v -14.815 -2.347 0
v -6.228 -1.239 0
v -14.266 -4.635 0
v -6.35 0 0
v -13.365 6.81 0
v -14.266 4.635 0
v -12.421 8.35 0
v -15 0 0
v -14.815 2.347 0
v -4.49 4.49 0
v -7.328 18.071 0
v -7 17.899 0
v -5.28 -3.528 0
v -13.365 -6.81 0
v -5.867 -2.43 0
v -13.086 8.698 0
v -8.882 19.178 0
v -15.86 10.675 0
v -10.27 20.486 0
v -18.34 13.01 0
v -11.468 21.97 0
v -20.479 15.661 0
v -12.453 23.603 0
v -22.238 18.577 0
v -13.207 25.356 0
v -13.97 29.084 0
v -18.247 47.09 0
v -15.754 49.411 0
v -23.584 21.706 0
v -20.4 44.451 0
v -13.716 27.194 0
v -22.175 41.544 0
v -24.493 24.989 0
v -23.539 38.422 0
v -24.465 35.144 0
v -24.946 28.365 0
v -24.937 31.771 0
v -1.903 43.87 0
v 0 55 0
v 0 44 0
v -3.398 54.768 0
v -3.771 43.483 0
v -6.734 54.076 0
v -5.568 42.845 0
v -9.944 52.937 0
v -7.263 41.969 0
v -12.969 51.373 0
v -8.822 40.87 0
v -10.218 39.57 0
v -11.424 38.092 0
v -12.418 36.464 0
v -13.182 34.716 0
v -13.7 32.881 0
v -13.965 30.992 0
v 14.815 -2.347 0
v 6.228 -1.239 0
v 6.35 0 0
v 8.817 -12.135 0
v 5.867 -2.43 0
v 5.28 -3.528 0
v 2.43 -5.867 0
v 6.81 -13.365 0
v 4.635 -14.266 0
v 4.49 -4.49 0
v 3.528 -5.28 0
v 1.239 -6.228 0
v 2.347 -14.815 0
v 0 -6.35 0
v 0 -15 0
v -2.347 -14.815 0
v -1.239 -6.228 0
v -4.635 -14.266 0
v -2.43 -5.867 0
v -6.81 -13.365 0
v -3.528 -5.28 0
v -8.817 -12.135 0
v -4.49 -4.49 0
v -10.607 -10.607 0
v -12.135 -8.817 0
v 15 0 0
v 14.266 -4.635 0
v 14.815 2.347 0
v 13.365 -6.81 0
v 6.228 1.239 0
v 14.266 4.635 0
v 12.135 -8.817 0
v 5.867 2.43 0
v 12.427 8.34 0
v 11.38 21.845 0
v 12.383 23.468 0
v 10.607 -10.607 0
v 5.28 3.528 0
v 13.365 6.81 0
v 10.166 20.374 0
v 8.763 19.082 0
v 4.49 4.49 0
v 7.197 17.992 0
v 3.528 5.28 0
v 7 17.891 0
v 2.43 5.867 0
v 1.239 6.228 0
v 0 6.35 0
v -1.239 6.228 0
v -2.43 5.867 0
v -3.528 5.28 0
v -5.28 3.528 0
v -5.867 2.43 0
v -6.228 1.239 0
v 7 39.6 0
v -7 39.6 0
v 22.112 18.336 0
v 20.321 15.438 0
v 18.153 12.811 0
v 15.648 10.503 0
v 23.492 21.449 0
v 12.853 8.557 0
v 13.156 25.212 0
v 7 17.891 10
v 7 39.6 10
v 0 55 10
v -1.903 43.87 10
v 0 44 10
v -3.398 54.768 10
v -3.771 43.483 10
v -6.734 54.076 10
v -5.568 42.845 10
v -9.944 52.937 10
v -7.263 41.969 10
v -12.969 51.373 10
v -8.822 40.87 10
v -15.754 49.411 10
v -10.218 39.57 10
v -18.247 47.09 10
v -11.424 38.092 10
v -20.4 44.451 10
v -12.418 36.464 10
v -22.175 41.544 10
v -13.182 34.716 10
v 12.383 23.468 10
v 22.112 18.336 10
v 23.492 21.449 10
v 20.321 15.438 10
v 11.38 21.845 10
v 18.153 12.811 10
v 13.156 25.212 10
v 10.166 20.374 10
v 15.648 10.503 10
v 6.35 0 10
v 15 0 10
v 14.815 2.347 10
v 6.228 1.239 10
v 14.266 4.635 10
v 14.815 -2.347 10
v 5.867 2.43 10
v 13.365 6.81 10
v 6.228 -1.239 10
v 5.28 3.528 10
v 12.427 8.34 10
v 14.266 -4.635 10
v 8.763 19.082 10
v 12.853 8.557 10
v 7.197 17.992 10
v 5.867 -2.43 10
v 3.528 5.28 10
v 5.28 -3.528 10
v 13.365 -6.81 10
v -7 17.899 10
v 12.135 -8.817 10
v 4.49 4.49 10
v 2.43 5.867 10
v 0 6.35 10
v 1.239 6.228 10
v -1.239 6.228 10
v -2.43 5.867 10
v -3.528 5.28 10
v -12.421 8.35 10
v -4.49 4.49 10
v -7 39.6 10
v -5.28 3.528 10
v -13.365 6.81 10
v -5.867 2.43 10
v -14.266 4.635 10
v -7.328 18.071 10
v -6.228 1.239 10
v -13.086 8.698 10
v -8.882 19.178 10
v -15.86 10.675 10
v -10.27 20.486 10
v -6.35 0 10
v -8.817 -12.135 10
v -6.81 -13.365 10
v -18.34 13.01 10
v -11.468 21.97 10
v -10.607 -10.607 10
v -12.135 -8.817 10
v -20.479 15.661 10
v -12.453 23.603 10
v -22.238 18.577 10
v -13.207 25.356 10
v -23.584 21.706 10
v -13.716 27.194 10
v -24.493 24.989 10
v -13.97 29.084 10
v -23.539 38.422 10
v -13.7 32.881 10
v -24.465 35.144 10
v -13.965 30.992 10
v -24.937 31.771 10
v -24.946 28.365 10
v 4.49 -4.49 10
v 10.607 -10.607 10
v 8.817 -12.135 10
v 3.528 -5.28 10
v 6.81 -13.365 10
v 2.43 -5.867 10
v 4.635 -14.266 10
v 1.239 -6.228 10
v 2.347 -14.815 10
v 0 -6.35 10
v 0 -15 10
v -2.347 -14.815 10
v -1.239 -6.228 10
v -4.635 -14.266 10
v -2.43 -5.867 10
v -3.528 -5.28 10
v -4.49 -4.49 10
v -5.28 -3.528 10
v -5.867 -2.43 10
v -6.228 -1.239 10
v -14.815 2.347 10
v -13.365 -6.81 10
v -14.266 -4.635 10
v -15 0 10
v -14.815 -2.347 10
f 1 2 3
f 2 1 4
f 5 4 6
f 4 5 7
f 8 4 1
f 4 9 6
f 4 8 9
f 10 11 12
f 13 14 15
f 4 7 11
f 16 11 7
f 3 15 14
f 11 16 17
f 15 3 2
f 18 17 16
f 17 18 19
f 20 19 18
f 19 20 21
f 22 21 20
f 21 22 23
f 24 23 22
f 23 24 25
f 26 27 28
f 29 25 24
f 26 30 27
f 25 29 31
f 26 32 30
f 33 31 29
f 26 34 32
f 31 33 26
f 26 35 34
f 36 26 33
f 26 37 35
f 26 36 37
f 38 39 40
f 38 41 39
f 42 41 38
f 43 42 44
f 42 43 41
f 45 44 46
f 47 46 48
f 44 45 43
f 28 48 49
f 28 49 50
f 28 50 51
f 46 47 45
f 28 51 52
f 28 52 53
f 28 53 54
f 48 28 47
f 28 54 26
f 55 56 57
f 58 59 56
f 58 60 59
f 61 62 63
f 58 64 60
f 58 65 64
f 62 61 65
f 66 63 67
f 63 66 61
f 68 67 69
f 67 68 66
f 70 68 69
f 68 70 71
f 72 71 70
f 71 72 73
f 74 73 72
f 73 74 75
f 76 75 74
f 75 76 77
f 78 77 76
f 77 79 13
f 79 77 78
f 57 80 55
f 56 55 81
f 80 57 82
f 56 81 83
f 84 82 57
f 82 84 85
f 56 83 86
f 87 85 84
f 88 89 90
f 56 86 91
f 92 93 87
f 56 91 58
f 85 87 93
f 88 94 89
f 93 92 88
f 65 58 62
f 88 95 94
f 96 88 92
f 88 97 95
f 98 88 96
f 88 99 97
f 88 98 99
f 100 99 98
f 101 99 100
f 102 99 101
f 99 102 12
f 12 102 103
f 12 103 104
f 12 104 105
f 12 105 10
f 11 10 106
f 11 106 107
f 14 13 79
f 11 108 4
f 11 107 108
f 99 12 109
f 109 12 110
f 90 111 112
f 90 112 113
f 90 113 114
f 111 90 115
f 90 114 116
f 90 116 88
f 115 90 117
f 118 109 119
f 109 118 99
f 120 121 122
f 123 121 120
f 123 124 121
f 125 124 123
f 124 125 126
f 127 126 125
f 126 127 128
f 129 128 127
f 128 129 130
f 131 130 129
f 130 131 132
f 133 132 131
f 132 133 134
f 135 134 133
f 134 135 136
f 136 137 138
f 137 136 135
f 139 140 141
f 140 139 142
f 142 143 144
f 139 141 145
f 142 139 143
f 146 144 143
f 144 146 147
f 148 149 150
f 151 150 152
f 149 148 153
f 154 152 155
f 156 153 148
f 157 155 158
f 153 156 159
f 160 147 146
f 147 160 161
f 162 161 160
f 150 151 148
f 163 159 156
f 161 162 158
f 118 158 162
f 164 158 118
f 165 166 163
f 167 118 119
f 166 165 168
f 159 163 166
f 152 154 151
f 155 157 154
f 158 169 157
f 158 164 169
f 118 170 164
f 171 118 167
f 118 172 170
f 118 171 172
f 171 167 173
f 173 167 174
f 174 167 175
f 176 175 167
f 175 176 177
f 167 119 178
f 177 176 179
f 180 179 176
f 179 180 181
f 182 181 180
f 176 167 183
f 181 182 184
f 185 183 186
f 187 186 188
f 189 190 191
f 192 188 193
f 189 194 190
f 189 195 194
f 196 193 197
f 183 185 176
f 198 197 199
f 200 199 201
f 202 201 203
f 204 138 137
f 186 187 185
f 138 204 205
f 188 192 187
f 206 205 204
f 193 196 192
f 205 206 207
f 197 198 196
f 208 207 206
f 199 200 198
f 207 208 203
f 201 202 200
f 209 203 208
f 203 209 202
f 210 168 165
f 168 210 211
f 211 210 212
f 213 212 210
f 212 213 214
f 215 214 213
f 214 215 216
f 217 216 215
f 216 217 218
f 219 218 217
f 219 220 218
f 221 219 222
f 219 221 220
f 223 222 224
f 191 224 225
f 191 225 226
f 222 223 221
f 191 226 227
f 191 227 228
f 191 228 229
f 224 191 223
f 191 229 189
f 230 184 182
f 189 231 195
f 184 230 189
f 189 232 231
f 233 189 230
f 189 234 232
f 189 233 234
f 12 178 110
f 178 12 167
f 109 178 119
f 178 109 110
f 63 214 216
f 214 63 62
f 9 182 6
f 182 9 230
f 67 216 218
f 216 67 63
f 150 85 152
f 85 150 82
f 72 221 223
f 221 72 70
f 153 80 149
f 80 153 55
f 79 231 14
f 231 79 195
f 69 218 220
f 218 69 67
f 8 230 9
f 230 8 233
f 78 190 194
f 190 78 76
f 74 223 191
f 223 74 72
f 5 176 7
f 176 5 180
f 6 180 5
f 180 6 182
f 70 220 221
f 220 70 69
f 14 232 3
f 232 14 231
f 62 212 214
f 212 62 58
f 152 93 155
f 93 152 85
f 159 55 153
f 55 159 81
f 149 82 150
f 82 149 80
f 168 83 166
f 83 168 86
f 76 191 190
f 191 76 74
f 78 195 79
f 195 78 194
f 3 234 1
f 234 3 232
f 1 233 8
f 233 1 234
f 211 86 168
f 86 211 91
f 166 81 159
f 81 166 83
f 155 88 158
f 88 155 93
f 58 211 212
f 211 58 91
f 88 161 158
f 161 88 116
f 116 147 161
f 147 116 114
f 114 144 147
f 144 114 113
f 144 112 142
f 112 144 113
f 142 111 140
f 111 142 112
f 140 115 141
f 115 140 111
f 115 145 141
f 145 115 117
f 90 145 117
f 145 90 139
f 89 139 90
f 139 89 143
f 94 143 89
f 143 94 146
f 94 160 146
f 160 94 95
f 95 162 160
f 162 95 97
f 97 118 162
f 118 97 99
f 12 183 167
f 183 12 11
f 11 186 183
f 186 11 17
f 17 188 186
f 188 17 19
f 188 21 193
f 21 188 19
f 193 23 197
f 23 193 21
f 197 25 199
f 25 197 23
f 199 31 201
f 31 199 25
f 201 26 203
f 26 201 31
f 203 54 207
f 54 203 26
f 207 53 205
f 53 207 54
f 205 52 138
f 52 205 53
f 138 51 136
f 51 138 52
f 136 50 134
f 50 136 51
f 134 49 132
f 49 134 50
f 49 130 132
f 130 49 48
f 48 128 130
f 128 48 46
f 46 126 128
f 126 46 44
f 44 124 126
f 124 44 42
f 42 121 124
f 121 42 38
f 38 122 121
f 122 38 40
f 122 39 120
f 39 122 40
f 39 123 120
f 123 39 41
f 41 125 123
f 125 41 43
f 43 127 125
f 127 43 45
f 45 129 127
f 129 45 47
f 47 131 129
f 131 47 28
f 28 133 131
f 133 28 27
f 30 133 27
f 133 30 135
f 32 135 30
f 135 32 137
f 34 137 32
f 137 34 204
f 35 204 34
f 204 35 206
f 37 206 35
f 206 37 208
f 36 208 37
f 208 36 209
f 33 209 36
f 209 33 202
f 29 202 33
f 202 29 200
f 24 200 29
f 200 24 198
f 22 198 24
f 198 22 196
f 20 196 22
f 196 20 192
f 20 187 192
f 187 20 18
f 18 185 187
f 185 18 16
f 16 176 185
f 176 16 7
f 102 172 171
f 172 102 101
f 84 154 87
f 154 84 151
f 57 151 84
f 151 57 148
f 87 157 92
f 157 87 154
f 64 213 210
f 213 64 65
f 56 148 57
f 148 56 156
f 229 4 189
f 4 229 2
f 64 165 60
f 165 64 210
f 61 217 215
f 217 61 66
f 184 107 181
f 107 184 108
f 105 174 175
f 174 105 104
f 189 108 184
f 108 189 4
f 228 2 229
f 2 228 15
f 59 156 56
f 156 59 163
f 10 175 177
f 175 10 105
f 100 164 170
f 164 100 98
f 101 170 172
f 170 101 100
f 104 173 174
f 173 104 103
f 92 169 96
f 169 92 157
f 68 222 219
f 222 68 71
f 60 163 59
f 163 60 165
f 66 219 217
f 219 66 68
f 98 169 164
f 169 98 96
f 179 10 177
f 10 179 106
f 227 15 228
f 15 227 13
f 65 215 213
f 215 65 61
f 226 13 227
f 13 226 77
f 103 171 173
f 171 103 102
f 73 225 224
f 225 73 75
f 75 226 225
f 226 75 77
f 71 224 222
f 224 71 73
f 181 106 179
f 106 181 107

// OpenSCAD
$fn = 32;

// ----------------------------------------------------------------------
// Hook: 60 mm shank into a 14 mm curl, 10 mm thick
// ----------------------------------------------------------------------

// --- parameters (mm) ---
shank_len = 60;           // shank length from the boss centre
shank_w = 14;             // shank width
boss_d = 30;              // boss diameter
bore_d = 12.7;            // boss bore
curl_in = 14;             // curl inner radius
curl_out = 25;            // curl outer radius
curl_sweep = 250;         // curl sweep angle
hook_t = 10;              // hook thickness

shank_profile = [[-7, 39.6], [7, 39.6], [7, 13], [-7, 13]];
boss_profile = [[15, 0], [14.815, 2.347], [14.266, 4.635], [13.365, 6.81], [12.135, 8.817], [10.607, 10.607], [8.817, 12.135], [6.81, 13.365], [4.635, 14.266], [2.347, 14.815], [0, 15], [-2.347, 14.815], [-4.635, 14.266], [-6.81, 13.365], [-8.817, 12.135], [-10.607, 10.607], [-12.135, 8.817], [-13.365, 6.81], [-14.266, 4.635], [-14.815, 2.347], [-15, 0], [-14.815, -2.347], [-14.266, -4.635], [-13.365, -6.81], [-12.135, -8.817], [-10.607, -10.607], [-8.817, -12.135], [-6.81, -13.365], [-4.635, -14.266], [-2.347, -14.815], [0, -15], [2.347, -14.815], [4.635, -14.266], [6.81, -13.365], [8.817, -12.135], [10.607, -10.607], [12.135, -8.817], [13.365, -6.81], [14.266, -4.635], [14.815, -2.347]];
curl_profile = [[0, 55], [-3.398, 54.768], [-6.734, 54.076], [-9.944, 52.937], [-12.969, 51.373], [-15.754, 49.411], [-18.247, 47.09], [-20.4, 44.451], [-22.175, 41.544], [-23.539, 38.422], [-24.465, 35.144], [-24.937, 31.771], [-24.946, 28.365], [-24.493, 24.989], [-23.584, 21.706], [-22.238, 18.577], [-20.479, 15.661], [-18.34, 13.01], [-15.86, 10.675], [-13.086, 8.698], [-10.069, 7.117], [-6.865, 5.961], [-3.533, 5.251], [-0.136, 5], [3.263, 5.214], [6.602, 5.888], [9.818, 7.009], [12.853, 8.557], [15.648, 10.503], [18.153, 12.811], [20.321, 15.438], [22.112, 18.336], [23.492, 21.449], [13.156, 25.212], [12.383, 23.468], [11.38, 21.845], [10.166, 20.374], [8.763, 19.082], [7.197, 17.992], [5.498, 17.125], [3.697, 16.497], [1.827, 16.12], [-0.076, 16], [-1.979, 16.141], [-3.844, 16.538], [-5.638, 17.186], [-7.328, 18.071], [-8.882, 19.178], [-10.27, 20.486], [-11.468, 21.97], [-12.453, 23.603], [-13.207, 25.356], [-13.716, 27.194], [-13.97, 29.084], [-13.965, 30.992], [-13.7, 32.881], [-13.182, 34.716], [-12.418, 36.464], [-11.424, 38.092], [-10.218, 39.57], [-8.822, 40.87], [-7.263, 41.969], [-5.568, 42.845], [-3.771, 43.483], [-1.903, 43.87], [0, 44]];

difference() {
  union() {
    /* three overlapping outlines: shank, boss and the smooth curl */
    linear_extrude(height = hook_t) polygon(shank_profile);
    linear_extrude(height = hook_t) polygon(boss_profile);
    linear_extrude(height = hook_t) polygon(curl_profile);
  }
  translate([0, 0, -2.5]) cylinder(h = hook_t + 5, d = bore_d);
}
